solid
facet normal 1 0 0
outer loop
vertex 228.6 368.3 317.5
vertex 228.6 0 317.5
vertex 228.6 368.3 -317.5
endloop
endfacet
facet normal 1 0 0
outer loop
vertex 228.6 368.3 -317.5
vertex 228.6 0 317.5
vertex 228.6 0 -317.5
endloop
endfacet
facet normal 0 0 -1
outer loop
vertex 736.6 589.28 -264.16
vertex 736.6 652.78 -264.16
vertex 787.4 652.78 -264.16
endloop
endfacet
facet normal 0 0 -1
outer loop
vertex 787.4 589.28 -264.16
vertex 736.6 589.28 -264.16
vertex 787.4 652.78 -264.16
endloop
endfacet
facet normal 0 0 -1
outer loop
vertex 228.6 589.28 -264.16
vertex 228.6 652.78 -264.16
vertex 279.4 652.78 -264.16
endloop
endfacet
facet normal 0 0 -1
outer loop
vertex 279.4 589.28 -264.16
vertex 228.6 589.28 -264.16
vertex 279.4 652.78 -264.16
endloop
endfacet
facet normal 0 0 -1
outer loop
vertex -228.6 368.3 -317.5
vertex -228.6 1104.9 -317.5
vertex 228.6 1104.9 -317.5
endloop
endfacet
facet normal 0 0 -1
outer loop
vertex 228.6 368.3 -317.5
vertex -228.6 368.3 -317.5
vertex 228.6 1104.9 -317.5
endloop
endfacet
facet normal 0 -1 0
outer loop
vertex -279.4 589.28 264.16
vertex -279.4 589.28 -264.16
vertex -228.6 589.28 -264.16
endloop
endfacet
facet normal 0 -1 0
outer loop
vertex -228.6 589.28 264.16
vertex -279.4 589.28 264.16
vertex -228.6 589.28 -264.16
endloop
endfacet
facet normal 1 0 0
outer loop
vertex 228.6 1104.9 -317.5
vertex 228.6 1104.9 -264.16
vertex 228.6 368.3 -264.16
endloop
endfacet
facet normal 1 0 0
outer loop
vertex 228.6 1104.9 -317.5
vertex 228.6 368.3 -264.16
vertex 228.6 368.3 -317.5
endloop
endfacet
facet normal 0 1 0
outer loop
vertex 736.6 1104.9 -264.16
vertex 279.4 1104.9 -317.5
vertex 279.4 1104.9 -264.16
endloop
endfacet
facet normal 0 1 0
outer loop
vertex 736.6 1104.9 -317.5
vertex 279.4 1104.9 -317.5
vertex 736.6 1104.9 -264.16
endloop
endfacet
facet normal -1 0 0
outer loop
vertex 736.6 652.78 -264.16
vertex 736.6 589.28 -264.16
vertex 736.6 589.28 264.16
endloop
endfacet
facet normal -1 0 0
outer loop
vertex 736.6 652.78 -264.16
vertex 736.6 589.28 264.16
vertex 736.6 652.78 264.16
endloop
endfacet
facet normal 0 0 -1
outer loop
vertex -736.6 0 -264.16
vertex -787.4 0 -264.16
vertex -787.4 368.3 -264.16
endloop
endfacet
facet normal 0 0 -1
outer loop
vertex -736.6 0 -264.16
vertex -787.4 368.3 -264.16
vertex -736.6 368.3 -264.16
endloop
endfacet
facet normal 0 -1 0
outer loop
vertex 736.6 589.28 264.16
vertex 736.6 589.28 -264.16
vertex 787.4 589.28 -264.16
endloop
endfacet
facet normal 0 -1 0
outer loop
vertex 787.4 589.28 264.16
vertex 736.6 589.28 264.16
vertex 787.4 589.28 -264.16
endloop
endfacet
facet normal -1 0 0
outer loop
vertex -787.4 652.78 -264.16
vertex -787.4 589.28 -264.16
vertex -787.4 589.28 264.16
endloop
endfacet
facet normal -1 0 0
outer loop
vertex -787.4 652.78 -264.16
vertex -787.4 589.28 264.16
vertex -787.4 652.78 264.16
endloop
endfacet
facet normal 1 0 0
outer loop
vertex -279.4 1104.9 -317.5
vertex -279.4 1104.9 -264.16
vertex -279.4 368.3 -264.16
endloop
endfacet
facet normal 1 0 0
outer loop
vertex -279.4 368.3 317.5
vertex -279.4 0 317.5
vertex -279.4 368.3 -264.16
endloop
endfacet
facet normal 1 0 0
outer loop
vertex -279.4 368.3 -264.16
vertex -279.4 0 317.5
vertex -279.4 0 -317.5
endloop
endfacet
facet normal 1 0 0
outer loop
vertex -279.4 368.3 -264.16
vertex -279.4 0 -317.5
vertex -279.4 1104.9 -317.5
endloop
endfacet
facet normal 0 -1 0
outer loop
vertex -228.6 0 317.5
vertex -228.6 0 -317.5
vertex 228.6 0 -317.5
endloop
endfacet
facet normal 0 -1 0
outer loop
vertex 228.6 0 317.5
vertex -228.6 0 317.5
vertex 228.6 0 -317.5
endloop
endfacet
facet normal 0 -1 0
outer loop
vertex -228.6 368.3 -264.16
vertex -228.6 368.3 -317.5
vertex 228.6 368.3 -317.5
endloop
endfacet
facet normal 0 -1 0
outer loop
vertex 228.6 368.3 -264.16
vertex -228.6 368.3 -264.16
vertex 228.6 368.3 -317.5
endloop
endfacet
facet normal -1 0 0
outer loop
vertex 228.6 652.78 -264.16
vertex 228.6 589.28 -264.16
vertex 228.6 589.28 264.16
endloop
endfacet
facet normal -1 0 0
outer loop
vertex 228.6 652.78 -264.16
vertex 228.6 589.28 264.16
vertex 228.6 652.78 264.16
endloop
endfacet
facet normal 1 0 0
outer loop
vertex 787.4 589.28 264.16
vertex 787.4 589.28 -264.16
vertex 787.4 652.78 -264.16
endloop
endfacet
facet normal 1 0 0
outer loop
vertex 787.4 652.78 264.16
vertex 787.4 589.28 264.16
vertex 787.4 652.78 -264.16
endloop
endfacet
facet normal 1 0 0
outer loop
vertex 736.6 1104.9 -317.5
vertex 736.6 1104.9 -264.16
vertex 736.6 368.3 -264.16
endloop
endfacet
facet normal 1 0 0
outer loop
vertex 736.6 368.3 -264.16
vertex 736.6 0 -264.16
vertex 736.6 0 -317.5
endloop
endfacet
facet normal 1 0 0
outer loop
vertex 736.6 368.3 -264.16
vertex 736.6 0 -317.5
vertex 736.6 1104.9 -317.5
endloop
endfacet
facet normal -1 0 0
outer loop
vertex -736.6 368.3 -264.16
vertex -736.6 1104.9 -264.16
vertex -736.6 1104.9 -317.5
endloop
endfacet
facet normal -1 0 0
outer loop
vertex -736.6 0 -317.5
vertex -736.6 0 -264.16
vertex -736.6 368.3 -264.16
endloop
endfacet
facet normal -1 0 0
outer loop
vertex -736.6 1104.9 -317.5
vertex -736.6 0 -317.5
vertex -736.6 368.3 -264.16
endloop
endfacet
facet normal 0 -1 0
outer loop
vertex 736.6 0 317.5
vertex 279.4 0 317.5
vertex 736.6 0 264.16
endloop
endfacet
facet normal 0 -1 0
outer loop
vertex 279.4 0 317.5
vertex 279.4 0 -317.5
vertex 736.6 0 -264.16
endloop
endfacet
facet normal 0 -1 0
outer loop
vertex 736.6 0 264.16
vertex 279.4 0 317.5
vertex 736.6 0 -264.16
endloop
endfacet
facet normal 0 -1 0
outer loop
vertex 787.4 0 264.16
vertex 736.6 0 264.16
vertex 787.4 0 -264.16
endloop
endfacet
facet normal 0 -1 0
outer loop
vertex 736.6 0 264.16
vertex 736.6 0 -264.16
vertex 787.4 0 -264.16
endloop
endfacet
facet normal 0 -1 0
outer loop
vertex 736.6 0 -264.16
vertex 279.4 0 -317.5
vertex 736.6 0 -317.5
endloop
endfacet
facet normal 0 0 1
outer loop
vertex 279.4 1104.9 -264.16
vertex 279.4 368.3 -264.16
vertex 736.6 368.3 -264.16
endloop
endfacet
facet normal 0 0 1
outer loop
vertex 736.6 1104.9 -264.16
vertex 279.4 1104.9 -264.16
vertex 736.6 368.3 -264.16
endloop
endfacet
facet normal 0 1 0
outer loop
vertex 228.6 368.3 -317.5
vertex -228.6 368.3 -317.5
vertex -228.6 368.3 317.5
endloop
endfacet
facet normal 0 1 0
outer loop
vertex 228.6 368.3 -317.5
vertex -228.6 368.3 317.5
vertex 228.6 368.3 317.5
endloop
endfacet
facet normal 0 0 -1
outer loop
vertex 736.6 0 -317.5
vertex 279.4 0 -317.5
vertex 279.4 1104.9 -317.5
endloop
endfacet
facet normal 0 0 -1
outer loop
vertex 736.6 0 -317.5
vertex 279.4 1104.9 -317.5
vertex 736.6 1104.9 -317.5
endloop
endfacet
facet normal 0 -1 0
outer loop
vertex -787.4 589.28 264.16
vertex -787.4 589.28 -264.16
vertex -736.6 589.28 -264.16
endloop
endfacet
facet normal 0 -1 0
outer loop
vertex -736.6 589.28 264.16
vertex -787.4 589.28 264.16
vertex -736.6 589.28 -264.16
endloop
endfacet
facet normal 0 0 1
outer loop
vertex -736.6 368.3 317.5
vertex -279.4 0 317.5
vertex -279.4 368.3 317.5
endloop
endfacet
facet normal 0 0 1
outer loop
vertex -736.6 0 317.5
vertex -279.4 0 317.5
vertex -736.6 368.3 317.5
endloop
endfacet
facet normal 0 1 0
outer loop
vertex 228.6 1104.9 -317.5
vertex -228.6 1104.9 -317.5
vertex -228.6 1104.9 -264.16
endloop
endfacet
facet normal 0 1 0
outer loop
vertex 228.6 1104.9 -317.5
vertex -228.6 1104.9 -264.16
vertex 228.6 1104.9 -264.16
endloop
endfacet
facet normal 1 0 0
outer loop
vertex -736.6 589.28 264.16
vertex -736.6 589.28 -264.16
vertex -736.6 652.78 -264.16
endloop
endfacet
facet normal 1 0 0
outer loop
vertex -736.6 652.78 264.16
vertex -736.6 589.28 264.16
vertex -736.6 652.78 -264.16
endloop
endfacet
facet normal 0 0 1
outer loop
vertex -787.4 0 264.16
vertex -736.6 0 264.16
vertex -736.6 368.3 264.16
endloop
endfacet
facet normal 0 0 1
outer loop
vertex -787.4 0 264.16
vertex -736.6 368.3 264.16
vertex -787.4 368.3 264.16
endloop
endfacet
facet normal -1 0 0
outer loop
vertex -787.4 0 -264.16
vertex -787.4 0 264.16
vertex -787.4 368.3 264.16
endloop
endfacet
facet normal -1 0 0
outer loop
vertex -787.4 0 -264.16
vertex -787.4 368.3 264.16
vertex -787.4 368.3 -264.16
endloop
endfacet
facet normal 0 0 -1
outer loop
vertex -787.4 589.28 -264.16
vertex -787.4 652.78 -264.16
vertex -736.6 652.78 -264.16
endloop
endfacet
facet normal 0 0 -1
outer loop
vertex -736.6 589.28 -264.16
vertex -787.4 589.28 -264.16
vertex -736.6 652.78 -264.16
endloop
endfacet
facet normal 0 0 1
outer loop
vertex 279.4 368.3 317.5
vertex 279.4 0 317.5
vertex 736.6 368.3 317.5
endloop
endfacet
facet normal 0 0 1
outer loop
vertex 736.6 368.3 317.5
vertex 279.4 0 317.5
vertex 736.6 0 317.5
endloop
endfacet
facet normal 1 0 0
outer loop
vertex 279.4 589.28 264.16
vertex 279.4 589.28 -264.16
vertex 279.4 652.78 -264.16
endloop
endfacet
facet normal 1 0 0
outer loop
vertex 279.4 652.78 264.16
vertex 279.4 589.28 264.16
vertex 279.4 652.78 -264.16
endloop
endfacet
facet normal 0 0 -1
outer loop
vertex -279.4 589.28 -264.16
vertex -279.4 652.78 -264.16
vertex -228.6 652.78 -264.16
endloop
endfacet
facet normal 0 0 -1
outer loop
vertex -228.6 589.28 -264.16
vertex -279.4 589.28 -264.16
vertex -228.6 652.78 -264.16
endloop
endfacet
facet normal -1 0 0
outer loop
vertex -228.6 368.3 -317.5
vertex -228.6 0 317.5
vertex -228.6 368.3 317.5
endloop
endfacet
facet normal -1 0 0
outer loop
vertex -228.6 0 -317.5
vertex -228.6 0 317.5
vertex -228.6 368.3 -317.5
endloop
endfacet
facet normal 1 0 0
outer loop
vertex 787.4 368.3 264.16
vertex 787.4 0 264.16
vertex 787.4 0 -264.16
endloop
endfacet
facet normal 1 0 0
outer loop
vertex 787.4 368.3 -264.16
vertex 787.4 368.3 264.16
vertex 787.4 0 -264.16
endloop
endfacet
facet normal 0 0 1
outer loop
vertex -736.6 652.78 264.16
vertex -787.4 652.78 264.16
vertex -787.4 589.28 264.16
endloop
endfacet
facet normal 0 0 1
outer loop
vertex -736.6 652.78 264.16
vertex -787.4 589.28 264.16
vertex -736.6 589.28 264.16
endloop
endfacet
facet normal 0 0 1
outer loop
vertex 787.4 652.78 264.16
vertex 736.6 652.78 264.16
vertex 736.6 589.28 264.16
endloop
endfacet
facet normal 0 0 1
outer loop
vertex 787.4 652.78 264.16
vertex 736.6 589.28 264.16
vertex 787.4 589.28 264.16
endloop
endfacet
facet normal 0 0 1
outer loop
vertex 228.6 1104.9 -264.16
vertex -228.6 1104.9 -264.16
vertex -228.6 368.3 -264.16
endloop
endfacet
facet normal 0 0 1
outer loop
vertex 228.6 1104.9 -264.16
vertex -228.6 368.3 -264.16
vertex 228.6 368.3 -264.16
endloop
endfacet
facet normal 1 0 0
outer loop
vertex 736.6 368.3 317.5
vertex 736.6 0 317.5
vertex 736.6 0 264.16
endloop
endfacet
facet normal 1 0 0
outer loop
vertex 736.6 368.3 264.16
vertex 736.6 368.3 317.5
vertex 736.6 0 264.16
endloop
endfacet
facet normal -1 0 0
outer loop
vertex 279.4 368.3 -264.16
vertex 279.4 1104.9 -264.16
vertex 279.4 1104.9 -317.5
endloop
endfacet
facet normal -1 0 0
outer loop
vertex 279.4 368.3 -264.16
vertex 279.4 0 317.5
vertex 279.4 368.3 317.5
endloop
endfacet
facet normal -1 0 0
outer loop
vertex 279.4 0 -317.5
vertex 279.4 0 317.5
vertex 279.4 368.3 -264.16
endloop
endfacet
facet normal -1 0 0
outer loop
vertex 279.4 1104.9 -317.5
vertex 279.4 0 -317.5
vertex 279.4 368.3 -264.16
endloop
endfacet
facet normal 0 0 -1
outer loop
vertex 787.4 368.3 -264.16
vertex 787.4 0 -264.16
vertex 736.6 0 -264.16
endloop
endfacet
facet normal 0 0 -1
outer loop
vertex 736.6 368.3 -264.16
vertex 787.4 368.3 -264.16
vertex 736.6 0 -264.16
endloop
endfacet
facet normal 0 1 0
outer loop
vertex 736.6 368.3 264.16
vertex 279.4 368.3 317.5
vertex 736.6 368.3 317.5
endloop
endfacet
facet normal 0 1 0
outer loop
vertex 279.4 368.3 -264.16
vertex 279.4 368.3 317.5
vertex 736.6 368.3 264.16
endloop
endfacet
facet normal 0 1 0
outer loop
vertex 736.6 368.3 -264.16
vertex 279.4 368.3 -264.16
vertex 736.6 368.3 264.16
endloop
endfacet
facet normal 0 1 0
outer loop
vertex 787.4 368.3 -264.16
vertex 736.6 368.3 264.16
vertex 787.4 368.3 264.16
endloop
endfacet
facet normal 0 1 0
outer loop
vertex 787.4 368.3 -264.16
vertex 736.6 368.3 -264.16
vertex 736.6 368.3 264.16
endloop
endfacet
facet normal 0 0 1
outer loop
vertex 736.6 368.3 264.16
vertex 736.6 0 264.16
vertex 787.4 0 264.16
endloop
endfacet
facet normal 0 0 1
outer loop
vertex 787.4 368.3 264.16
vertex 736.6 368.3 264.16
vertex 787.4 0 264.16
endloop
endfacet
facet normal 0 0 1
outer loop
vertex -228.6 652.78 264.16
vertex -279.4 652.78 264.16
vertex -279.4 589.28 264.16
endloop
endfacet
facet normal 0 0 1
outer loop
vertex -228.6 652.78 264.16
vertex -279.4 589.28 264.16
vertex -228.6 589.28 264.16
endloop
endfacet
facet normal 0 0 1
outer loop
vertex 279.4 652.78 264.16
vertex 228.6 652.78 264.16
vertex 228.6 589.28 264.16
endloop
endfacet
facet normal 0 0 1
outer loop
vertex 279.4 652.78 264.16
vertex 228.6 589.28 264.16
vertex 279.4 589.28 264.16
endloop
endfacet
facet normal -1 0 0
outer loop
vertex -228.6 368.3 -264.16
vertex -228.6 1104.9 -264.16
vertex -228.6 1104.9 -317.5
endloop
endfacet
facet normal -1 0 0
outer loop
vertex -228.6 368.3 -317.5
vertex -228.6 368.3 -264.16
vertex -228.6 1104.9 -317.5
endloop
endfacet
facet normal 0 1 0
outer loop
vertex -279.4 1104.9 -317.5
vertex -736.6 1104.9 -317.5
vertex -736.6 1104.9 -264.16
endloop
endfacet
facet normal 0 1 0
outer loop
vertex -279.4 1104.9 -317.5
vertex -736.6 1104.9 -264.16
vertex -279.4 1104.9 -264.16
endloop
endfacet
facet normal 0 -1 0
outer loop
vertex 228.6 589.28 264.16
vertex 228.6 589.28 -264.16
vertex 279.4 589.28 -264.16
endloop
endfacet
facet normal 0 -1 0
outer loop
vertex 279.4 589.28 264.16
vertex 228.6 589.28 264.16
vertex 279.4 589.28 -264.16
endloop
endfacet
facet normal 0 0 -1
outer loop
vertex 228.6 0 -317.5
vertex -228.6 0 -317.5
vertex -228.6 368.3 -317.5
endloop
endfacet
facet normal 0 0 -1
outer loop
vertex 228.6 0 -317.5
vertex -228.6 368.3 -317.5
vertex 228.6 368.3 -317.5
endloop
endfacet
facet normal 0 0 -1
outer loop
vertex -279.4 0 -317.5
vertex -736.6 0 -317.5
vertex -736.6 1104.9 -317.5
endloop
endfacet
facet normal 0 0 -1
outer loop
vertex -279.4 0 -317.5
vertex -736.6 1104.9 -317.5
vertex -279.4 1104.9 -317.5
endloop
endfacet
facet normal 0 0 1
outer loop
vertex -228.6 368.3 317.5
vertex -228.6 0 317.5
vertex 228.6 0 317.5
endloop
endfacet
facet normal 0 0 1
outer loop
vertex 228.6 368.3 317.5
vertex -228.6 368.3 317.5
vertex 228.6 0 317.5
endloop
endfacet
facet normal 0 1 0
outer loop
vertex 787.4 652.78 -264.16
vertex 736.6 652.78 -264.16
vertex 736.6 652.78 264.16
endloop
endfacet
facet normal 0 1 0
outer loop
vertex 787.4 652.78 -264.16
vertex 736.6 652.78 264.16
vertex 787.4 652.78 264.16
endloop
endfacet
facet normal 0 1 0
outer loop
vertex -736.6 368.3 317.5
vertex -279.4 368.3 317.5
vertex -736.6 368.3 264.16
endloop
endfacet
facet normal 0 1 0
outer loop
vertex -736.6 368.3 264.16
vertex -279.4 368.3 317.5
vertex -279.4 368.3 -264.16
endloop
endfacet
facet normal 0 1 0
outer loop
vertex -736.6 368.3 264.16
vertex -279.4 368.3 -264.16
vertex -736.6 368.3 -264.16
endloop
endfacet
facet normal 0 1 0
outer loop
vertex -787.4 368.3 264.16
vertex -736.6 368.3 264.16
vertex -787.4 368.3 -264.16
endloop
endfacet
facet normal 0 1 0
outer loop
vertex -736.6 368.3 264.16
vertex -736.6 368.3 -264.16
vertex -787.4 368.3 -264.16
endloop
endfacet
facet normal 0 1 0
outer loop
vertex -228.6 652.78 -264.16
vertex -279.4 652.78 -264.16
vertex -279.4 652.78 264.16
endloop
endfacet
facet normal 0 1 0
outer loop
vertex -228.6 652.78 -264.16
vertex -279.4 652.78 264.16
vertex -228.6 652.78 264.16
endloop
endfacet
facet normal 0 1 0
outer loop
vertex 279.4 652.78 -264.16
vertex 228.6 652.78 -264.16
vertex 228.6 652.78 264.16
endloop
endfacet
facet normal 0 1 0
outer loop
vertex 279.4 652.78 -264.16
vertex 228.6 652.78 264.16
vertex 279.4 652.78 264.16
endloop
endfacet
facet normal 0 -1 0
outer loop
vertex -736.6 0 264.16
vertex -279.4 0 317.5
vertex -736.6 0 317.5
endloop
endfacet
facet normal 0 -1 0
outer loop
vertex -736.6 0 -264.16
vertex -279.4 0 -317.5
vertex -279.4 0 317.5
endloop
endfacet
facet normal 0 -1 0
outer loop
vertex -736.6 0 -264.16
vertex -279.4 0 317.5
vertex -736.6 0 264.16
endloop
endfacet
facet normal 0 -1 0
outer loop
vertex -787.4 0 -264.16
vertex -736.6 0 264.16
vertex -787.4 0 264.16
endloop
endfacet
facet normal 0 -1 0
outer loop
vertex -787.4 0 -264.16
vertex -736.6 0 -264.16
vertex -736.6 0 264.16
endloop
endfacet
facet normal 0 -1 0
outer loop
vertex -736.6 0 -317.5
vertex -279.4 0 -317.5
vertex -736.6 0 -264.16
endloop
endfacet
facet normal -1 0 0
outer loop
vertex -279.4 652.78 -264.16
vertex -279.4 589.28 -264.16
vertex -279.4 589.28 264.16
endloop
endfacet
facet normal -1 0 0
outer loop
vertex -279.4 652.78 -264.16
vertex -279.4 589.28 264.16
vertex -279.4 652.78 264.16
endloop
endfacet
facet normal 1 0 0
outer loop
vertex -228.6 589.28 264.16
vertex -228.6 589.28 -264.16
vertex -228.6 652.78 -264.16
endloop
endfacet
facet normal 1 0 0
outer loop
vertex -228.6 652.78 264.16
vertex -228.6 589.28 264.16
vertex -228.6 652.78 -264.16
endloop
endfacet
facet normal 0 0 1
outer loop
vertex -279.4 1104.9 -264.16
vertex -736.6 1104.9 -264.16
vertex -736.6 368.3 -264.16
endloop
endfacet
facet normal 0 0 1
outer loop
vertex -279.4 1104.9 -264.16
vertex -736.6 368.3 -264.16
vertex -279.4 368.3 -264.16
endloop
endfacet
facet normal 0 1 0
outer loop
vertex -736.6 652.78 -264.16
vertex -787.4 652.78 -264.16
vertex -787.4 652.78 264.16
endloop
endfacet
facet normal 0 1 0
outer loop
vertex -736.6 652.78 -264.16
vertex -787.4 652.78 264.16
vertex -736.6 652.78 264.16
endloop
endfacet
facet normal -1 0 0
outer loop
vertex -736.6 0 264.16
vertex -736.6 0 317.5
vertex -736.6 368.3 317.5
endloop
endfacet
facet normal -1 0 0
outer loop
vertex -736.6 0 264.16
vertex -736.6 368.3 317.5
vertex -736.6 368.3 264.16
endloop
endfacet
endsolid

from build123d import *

# Parameters (mm, degrees)
BOSS_EXTRUDE1_DEPTH   = 368.3
BOSS_EXTRUDE1_2_DEPTH = 368.3
SKETCH1_W             = 457.2
SKETCH1_H             = 635
BOSS_EXTRUDE1_3_DEPTH = 368.3
SKETCH2_W             = 457.2
SKETCH2_H             = 53.34
BOSS_EXTRUDE2_DEPTH   = 736.6
SKETCH3_W             = 50.8
SKETCH3_H             = 63.5
BOSS_EXTRUDE3_DEPTH   = 528.32
BOSS_EXTRUDE3_2_DEPTH = 528.32
BOSS_EXTRUDE3_3_DEPTH = 528.32
BOSS_EXTRUDE3_4_DEPTH = 528.32


with BuildPart() as part:
    # Sketch1 → Boss-Extrude1 (new body)
    with BuildSketch(Plane(origin=(0, 0, 0), x_dir=(1, 0, 0), z_dir=(0, 1, 0))):
        Polygon((-787.4, 264.16), (-736.6, 264.16), (-736.6, 317.5), (-279.4, 317.5), (-279.4, -317.5), (-736.6, -317.5), (-736.6, -264.16), (-787.4, -264.16), align=None)
    extrude(amount=BOSS_EXTRUDE1_DEPTH)



with BuildPart() as body_2:
    # Sketch1 → Boss-Extrude1 2 (new body)
    with BuildSketch(Plane(origin=(0, 0, 0), x_dir=(1, 0, 0), z_dir=(0, 1, 0))):
        Polygon((279.4, -317.5), (736.6, -317.5), (736.6, -264.16), (787.4, -264.16), (787.4, 264.16), (736.6, 264.16), (736.6, 317.5), (279.4, 317.5), align=None)
    extrude(amount=BOSS_EXTRUDE1_2_DEPTH)


with BuildPart() as body_3:
    # Sketch1 → Boss-Extrude1 3 (new body)
    with BuildSketch(Plane(origin=(0, 0, 0), x_dir=(1, 0, 0), z_dir=(0, 1, 0))):
        Rectangle(SKETCH1_W, SKETCH1_H)
    extrude(amount=BOSS_EXTRUDE1_3_DEPTH)


with BuildPart() as part_1:
    add(part.part)

    add(body_2.part)  # Boss-Extrude2 merges body 2
    # Sketch2 → Boss-Extrude2 (add)
    with BuildSketch(Plane(origin=(0, 368.3, 0), x_dir=(1, 0, 0), z_dir=(0, 1, 0))):
        with Locations((-508, 290.83)):
            Rectangle(SKETCH2_W, SKETCH2_H)
        with Locations((508, 290.83)):
            Rectangle(SKETCH2_W, SKETCH2_H)
        with Locations((0, 290.83)):
            Rectangle(SKETCH2_W, SKETCH2_H)
    extrude(amount=BOSS_EXTRUDE2_DEPTH)


with BuildPart() as body_3_2:
    # Sketch3 → Boss-Extrude3 (new body)
    with BuildSketch(Plane.XY.offset(-264.16)):
        with Locations((-762, 621.03)):
            Rectangle(SKETCH3_W, SKETCH3_H)
    extrude(amount=BOSS_EXTRUDE3_DEPTH)


with BuildPart() as body_4:
    # Sketch3 → Boss-Extrude3 2 (new body)
    with BuildSketch(Plane.XY.offset(-264.16)):
        with Locations((762, 621.03)):
            Rectangle(SKETCH3_W, SKETCH3_H)
    extrude(amount=BOSS_EXTRUDE3_2_DEPTH)


with BuildPart() as body_5:
    # Sketch3 → Boss-Extrude3 3 (new body)
    with BuildSketch(Plane.XY.offset(-264.16)):
        with Locations((-254, 621.03)):
            Rectangle(SKETCH3_W, SKETCH3_H)
    extrude(amount=BOSS_EXTRUDE3_3_DEPTH)


with BuildPart() as body_6:
    # Sketch3 → Boss-Extrude3 4 (new body)
    with BuildSketch(Plane.XY.offset(-264.16)):
        with Locations((254, 621.03)):
            Rectangle(SKETCH3_W, SKETCH3_H)
    extrude(amount=BOSS_EXTRUDE3_4_DEPTH)


solid = Compound([body_3.part, part_1.part, body_3_2.part, body_4.part, body_5.part, body_6.part])
